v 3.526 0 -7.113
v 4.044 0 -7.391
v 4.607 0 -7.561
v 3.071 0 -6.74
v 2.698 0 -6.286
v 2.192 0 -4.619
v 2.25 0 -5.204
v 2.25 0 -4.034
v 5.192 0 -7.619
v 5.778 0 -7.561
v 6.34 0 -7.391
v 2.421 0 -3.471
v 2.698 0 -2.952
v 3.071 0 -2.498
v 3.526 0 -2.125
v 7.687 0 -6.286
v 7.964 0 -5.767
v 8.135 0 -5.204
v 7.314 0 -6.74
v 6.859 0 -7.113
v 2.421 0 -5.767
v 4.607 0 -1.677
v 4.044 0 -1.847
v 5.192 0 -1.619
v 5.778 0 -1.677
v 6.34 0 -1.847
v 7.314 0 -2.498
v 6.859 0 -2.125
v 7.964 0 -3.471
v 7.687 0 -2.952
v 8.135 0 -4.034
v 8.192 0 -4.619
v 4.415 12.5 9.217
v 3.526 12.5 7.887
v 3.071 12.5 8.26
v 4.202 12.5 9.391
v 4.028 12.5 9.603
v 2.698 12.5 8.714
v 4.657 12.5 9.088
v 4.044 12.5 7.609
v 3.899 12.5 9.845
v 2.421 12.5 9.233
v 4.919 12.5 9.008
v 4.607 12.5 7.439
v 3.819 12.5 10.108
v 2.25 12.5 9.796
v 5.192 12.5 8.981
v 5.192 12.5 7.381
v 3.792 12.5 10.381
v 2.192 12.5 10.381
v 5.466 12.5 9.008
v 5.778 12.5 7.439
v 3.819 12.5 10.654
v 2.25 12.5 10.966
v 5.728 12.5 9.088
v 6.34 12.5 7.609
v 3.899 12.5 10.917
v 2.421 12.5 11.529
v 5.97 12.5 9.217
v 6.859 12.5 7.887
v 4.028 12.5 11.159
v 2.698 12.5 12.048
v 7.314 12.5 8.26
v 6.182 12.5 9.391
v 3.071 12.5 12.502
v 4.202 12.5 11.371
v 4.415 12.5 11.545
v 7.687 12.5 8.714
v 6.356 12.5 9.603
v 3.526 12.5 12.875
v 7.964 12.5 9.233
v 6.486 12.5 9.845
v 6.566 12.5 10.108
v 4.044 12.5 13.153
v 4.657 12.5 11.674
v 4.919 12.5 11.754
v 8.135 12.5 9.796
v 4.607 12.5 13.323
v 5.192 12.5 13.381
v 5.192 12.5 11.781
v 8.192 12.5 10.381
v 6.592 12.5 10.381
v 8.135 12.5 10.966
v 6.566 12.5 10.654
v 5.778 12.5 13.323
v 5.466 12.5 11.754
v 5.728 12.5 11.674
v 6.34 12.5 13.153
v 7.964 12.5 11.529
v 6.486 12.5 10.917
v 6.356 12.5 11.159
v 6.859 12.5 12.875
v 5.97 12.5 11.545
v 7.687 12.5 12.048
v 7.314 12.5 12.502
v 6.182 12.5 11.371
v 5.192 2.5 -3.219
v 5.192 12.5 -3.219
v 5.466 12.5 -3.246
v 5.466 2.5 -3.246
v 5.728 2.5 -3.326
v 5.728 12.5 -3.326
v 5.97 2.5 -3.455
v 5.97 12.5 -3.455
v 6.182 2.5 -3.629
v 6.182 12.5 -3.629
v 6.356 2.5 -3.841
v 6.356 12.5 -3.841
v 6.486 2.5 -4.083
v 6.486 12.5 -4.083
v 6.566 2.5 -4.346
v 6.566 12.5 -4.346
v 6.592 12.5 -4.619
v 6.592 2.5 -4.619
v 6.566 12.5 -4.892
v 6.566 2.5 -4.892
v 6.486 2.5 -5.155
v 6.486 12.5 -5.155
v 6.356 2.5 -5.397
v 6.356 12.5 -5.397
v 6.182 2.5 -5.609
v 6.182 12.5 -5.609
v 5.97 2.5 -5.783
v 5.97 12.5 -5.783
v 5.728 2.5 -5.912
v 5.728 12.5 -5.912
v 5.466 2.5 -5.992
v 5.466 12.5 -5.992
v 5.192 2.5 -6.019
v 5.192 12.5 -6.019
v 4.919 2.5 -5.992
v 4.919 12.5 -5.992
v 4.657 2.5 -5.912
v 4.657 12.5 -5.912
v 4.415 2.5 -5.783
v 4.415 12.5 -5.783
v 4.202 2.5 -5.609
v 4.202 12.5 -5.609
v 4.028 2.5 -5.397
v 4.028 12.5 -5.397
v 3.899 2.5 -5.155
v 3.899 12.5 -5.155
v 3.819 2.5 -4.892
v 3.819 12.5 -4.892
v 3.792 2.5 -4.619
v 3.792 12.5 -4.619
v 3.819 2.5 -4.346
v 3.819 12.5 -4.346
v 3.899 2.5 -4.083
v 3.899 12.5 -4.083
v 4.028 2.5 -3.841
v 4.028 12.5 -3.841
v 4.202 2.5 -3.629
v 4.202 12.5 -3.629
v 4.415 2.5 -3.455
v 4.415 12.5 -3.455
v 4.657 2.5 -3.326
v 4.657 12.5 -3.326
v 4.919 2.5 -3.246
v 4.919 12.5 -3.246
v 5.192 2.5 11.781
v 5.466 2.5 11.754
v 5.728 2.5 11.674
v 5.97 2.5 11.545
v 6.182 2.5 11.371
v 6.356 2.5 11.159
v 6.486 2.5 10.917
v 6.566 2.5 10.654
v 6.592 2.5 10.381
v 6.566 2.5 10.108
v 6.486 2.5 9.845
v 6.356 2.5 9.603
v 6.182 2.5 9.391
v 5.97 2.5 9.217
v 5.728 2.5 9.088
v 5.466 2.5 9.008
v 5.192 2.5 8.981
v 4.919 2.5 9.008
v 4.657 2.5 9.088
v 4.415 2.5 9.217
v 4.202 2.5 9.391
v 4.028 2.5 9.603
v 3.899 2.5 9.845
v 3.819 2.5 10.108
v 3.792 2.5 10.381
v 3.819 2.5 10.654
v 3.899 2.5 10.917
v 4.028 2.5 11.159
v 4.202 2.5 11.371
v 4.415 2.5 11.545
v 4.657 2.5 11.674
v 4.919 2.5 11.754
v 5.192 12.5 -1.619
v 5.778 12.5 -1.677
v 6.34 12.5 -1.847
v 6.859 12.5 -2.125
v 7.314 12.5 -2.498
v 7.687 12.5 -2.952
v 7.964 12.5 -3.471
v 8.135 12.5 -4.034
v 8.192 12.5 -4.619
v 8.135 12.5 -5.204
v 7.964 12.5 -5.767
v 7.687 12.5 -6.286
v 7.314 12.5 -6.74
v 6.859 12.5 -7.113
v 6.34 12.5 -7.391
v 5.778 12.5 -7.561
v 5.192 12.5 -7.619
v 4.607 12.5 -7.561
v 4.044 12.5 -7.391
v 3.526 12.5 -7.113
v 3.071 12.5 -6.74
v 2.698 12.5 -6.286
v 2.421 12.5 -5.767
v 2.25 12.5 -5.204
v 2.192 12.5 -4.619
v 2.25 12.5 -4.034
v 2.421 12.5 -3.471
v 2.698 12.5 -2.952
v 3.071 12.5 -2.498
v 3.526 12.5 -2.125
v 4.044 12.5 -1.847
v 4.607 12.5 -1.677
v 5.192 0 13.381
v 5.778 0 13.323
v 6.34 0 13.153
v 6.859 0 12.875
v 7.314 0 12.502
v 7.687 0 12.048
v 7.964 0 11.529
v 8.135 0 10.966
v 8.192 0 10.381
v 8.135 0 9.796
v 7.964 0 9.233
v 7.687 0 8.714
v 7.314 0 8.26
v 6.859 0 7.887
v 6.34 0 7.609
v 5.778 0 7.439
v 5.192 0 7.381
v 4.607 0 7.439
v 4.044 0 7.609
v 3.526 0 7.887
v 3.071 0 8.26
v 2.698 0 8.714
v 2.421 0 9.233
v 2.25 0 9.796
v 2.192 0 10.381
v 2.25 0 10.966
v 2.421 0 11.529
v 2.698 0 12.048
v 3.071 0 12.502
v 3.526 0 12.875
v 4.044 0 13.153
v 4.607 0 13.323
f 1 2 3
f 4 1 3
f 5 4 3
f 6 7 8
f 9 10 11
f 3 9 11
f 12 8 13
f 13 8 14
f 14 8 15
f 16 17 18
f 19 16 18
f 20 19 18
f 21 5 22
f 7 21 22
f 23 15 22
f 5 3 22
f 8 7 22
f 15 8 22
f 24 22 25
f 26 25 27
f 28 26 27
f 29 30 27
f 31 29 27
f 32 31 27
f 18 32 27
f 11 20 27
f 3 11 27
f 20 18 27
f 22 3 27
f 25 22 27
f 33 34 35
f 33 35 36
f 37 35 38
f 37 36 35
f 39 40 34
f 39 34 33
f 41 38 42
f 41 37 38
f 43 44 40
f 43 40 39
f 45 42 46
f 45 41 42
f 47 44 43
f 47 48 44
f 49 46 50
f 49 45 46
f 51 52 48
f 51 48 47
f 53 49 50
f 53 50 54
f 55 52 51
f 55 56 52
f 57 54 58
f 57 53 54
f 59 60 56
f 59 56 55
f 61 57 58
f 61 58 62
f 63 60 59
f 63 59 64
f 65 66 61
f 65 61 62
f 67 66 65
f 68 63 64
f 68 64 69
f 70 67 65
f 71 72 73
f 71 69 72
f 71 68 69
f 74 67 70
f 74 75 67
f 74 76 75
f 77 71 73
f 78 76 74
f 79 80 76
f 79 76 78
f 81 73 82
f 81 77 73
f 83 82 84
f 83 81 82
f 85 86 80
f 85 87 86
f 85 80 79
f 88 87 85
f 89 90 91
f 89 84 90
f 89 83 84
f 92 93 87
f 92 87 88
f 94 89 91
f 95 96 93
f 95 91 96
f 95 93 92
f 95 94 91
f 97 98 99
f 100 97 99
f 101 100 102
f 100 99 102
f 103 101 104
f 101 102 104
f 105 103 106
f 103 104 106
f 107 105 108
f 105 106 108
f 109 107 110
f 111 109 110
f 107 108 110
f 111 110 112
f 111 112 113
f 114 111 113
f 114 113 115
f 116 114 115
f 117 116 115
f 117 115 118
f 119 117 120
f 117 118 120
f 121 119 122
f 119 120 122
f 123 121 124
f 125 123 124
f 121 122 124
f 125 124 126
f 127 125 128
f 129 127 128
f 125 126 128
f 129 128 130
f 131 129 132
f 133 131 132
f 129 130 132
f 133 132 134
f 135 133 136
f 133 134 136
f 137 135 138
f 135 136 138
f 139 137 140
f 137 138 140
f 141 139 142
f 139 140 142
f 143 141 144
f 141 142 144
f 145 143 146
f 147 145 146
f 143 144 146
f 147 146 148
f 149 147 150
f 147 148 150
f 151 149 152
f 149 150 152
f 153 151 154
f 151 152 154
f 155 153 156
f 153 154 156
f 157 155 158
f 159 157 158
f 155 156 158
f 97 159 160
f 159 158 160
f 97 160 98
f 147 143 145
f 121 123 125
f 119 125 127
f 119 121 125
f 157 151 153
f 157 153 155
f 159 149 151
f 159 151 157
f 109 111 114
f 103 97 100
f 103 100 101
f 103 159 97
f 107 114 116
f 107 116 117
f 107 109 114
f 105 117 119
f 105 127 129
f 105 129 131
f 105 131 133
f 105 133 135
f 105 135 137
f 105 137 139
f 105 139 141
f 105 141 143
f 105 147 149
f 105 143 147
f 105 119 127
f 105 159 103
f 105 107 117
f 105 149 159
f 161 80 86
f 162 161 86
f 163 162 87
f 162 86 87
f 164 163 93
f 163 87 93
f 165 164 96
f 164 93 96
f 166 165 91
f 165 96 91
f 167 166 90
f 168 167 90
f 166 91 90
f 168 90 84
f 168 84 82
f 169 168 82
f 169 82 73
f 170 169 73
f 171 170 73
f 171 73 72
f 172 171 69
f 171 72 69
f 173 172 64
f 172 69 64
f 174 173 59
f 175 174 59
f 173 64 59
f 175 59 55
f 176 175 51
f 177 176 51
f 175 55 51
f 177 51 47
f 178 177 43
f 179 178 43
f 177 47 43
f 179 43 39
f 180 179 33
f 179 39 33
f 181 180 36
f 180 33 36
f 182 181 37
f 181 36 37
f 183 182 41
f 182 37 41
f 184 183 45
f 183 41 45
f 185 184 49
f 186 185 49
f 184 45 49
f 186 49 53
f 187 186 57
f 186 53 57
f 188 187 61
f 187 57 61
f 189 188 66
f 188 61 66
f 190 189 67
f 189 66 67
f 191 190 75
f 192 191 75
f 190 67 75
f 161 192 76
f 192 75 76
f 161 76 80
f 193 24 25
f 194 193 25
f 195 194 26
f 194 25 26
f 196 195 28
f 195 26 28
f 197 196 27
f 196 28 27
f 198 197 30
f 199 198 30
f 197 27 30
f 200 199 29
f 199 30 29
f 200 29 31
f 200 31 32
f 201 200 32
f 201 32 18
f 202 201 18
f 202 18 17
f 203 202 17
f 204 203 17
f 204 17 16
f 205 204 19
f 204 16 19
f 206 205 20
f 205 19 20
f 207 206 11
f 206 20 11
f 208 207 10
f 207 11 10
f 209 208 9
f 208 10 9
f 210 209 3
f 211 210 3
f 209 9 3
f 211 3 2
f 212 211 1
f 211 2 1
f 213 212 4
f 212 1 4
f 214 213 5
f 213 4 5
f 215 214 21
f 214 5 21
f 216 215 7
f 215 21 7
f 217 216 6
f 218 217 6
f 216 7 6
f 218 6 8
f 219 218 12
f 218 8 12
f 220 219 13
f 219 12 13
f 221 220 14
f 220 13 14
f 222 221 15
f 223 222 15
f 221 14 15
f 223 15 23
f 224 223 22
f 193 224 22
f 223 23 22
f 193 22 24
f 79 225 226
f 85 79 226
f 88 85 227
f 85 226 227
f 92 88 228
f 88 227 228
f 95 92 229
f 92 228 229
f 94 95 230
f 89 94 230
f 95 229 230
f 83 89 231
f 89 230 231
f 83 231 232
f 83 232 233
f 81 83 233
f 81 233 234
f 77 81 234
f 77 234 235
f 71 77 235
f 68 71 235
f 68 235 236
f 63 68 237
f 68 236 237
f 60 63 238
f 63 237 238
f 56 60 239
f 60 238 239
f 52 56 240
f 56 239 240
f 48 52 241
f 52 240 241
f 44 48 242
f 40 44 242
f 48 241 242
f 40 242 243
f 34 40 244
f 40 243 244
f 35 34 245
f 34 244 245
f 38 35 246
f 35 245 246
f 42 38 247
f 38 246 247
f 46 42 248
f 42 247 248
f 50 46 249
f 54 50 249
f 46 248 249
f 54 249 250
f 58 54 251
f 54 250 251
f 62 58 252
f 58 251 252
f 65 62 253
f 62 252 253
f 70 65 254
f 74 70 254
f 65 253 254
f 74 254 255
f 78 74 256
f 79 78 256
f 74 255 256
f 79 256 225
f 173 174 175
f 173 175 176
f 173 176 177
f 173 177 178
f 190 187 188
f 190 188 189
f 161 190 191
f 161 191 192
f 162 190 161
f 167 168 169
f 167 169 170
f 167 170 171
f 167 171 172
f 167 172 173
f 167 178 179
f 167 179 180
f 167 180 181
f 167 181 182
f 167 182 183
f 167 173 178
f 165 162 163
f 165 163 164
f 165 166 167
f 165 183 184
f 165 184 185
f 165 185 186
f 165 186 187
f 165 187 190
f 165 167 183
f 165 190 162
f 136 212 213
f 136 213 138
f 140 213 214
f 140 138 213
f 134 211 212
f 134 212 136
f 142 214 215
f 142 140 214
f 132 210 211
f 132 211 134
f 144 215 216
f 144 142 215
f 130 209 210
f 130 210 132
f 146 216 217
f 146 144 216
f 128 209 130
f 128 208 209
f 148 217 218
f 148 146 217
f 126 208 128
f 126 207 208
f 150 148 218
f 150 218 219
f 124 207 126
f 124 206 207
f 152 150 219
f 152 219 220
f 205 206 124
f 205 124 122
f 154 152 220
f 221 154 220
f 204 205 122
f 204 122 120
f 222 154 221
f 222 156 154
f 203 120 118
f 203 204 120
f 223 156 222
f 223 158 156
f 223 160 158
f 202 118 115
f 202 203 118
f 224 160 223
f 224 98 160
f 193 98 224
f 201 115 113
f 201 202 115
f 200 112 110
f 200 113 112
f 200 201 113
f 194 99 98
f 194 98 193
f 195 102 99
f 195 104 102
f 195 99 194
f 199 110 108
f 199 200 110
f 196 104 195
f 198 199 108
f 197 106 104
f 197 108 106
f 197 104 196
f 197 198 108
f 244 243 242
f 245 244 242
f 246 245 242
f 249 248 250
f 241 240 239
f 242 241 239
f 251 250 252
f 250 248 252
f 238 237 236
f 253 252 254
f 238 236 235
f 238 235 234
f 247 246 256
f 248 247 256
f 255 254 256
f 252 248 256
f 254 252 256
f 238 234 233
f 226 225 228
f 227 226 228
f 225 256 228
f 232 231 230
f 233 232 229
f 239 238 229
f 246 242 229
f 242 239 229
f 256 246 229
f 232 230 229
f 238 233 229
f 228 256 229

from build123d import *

# Parameters (mm, degrees)
SKETCH1_R             = 3
BOSS_EXTRUDE1_DEPTH   = 12.5
BOSS_EXTRUDE1_2_DEPTH = 12.5
SKETCH2_R             = 1.4
CUT_EXTRUDE1_DEPTH    = 10


with BuildPart() as part:
    # Sketch1 → Boss-Extrude1 (new body)
    with BuildSketch(Plane(origin=(0, 0, 0), x_dir=(1, 0, 0), z_dir=(0, 1, 0))):
        with Locations(Location((5.192431817, 4.618996496, 0), (0, 0, 270))):
            Circle(SKETCH1_R)
    extrude(amount=BOSS_EXTRUDE1_DEPTH)


with BuildPart() as body_2:
    # Sketch1 → Boss-Extrude1 2 (new body)
    with BuildSketch(Plane(origin=(0, 0, 0), x_dir=(1, 0, 0), z_dir=(0, 1, 0))):
        with Locations(Location((5.192431817, -10.381003504, 0), (0, 0, 270))):
            Circle(SKETCH1_R)
    extrude(amount=BOSS_EXTRUDE1_2_DEPTH)


with BuildPart() as cut_extrude1_tool:
    # Sketch2 → Cut-Extrude1 (new body)
    with BuildSketch(Plane(origin=(0, 12.5, 0), x_dir=(1, 0, 0), z_dir=(0, 1, 0))):
        with Locations(Location((5.192431817, 4.618996496, 0), (0, 0, 270))):
            Circle(SKETCH2_R)
        with Locations(Location((5.192431817, -10.381003504, 0), (0, 0, 270))):
            Circle(SKETCH2_R)
    extrude(amount=-CUT_EXTRUDE1_DEPTH)


with BuildPart() as part_1:
    add(part.part)

    # Cut-Extrude1: cut by cut_extrude1_tool
    add(cut_extrude1_tool.part, mode=Mode.SUBTRACT)


with BuildPart() as body_2_1:
    add(body_2.part)

    # Cut-Extrude1: cut by cut_extrude1_tool
    add(cut_extrude1_tool.part, mode=Mode.SUBTRACT)


solid = Compound([part_1.part, body_2_1.part])
